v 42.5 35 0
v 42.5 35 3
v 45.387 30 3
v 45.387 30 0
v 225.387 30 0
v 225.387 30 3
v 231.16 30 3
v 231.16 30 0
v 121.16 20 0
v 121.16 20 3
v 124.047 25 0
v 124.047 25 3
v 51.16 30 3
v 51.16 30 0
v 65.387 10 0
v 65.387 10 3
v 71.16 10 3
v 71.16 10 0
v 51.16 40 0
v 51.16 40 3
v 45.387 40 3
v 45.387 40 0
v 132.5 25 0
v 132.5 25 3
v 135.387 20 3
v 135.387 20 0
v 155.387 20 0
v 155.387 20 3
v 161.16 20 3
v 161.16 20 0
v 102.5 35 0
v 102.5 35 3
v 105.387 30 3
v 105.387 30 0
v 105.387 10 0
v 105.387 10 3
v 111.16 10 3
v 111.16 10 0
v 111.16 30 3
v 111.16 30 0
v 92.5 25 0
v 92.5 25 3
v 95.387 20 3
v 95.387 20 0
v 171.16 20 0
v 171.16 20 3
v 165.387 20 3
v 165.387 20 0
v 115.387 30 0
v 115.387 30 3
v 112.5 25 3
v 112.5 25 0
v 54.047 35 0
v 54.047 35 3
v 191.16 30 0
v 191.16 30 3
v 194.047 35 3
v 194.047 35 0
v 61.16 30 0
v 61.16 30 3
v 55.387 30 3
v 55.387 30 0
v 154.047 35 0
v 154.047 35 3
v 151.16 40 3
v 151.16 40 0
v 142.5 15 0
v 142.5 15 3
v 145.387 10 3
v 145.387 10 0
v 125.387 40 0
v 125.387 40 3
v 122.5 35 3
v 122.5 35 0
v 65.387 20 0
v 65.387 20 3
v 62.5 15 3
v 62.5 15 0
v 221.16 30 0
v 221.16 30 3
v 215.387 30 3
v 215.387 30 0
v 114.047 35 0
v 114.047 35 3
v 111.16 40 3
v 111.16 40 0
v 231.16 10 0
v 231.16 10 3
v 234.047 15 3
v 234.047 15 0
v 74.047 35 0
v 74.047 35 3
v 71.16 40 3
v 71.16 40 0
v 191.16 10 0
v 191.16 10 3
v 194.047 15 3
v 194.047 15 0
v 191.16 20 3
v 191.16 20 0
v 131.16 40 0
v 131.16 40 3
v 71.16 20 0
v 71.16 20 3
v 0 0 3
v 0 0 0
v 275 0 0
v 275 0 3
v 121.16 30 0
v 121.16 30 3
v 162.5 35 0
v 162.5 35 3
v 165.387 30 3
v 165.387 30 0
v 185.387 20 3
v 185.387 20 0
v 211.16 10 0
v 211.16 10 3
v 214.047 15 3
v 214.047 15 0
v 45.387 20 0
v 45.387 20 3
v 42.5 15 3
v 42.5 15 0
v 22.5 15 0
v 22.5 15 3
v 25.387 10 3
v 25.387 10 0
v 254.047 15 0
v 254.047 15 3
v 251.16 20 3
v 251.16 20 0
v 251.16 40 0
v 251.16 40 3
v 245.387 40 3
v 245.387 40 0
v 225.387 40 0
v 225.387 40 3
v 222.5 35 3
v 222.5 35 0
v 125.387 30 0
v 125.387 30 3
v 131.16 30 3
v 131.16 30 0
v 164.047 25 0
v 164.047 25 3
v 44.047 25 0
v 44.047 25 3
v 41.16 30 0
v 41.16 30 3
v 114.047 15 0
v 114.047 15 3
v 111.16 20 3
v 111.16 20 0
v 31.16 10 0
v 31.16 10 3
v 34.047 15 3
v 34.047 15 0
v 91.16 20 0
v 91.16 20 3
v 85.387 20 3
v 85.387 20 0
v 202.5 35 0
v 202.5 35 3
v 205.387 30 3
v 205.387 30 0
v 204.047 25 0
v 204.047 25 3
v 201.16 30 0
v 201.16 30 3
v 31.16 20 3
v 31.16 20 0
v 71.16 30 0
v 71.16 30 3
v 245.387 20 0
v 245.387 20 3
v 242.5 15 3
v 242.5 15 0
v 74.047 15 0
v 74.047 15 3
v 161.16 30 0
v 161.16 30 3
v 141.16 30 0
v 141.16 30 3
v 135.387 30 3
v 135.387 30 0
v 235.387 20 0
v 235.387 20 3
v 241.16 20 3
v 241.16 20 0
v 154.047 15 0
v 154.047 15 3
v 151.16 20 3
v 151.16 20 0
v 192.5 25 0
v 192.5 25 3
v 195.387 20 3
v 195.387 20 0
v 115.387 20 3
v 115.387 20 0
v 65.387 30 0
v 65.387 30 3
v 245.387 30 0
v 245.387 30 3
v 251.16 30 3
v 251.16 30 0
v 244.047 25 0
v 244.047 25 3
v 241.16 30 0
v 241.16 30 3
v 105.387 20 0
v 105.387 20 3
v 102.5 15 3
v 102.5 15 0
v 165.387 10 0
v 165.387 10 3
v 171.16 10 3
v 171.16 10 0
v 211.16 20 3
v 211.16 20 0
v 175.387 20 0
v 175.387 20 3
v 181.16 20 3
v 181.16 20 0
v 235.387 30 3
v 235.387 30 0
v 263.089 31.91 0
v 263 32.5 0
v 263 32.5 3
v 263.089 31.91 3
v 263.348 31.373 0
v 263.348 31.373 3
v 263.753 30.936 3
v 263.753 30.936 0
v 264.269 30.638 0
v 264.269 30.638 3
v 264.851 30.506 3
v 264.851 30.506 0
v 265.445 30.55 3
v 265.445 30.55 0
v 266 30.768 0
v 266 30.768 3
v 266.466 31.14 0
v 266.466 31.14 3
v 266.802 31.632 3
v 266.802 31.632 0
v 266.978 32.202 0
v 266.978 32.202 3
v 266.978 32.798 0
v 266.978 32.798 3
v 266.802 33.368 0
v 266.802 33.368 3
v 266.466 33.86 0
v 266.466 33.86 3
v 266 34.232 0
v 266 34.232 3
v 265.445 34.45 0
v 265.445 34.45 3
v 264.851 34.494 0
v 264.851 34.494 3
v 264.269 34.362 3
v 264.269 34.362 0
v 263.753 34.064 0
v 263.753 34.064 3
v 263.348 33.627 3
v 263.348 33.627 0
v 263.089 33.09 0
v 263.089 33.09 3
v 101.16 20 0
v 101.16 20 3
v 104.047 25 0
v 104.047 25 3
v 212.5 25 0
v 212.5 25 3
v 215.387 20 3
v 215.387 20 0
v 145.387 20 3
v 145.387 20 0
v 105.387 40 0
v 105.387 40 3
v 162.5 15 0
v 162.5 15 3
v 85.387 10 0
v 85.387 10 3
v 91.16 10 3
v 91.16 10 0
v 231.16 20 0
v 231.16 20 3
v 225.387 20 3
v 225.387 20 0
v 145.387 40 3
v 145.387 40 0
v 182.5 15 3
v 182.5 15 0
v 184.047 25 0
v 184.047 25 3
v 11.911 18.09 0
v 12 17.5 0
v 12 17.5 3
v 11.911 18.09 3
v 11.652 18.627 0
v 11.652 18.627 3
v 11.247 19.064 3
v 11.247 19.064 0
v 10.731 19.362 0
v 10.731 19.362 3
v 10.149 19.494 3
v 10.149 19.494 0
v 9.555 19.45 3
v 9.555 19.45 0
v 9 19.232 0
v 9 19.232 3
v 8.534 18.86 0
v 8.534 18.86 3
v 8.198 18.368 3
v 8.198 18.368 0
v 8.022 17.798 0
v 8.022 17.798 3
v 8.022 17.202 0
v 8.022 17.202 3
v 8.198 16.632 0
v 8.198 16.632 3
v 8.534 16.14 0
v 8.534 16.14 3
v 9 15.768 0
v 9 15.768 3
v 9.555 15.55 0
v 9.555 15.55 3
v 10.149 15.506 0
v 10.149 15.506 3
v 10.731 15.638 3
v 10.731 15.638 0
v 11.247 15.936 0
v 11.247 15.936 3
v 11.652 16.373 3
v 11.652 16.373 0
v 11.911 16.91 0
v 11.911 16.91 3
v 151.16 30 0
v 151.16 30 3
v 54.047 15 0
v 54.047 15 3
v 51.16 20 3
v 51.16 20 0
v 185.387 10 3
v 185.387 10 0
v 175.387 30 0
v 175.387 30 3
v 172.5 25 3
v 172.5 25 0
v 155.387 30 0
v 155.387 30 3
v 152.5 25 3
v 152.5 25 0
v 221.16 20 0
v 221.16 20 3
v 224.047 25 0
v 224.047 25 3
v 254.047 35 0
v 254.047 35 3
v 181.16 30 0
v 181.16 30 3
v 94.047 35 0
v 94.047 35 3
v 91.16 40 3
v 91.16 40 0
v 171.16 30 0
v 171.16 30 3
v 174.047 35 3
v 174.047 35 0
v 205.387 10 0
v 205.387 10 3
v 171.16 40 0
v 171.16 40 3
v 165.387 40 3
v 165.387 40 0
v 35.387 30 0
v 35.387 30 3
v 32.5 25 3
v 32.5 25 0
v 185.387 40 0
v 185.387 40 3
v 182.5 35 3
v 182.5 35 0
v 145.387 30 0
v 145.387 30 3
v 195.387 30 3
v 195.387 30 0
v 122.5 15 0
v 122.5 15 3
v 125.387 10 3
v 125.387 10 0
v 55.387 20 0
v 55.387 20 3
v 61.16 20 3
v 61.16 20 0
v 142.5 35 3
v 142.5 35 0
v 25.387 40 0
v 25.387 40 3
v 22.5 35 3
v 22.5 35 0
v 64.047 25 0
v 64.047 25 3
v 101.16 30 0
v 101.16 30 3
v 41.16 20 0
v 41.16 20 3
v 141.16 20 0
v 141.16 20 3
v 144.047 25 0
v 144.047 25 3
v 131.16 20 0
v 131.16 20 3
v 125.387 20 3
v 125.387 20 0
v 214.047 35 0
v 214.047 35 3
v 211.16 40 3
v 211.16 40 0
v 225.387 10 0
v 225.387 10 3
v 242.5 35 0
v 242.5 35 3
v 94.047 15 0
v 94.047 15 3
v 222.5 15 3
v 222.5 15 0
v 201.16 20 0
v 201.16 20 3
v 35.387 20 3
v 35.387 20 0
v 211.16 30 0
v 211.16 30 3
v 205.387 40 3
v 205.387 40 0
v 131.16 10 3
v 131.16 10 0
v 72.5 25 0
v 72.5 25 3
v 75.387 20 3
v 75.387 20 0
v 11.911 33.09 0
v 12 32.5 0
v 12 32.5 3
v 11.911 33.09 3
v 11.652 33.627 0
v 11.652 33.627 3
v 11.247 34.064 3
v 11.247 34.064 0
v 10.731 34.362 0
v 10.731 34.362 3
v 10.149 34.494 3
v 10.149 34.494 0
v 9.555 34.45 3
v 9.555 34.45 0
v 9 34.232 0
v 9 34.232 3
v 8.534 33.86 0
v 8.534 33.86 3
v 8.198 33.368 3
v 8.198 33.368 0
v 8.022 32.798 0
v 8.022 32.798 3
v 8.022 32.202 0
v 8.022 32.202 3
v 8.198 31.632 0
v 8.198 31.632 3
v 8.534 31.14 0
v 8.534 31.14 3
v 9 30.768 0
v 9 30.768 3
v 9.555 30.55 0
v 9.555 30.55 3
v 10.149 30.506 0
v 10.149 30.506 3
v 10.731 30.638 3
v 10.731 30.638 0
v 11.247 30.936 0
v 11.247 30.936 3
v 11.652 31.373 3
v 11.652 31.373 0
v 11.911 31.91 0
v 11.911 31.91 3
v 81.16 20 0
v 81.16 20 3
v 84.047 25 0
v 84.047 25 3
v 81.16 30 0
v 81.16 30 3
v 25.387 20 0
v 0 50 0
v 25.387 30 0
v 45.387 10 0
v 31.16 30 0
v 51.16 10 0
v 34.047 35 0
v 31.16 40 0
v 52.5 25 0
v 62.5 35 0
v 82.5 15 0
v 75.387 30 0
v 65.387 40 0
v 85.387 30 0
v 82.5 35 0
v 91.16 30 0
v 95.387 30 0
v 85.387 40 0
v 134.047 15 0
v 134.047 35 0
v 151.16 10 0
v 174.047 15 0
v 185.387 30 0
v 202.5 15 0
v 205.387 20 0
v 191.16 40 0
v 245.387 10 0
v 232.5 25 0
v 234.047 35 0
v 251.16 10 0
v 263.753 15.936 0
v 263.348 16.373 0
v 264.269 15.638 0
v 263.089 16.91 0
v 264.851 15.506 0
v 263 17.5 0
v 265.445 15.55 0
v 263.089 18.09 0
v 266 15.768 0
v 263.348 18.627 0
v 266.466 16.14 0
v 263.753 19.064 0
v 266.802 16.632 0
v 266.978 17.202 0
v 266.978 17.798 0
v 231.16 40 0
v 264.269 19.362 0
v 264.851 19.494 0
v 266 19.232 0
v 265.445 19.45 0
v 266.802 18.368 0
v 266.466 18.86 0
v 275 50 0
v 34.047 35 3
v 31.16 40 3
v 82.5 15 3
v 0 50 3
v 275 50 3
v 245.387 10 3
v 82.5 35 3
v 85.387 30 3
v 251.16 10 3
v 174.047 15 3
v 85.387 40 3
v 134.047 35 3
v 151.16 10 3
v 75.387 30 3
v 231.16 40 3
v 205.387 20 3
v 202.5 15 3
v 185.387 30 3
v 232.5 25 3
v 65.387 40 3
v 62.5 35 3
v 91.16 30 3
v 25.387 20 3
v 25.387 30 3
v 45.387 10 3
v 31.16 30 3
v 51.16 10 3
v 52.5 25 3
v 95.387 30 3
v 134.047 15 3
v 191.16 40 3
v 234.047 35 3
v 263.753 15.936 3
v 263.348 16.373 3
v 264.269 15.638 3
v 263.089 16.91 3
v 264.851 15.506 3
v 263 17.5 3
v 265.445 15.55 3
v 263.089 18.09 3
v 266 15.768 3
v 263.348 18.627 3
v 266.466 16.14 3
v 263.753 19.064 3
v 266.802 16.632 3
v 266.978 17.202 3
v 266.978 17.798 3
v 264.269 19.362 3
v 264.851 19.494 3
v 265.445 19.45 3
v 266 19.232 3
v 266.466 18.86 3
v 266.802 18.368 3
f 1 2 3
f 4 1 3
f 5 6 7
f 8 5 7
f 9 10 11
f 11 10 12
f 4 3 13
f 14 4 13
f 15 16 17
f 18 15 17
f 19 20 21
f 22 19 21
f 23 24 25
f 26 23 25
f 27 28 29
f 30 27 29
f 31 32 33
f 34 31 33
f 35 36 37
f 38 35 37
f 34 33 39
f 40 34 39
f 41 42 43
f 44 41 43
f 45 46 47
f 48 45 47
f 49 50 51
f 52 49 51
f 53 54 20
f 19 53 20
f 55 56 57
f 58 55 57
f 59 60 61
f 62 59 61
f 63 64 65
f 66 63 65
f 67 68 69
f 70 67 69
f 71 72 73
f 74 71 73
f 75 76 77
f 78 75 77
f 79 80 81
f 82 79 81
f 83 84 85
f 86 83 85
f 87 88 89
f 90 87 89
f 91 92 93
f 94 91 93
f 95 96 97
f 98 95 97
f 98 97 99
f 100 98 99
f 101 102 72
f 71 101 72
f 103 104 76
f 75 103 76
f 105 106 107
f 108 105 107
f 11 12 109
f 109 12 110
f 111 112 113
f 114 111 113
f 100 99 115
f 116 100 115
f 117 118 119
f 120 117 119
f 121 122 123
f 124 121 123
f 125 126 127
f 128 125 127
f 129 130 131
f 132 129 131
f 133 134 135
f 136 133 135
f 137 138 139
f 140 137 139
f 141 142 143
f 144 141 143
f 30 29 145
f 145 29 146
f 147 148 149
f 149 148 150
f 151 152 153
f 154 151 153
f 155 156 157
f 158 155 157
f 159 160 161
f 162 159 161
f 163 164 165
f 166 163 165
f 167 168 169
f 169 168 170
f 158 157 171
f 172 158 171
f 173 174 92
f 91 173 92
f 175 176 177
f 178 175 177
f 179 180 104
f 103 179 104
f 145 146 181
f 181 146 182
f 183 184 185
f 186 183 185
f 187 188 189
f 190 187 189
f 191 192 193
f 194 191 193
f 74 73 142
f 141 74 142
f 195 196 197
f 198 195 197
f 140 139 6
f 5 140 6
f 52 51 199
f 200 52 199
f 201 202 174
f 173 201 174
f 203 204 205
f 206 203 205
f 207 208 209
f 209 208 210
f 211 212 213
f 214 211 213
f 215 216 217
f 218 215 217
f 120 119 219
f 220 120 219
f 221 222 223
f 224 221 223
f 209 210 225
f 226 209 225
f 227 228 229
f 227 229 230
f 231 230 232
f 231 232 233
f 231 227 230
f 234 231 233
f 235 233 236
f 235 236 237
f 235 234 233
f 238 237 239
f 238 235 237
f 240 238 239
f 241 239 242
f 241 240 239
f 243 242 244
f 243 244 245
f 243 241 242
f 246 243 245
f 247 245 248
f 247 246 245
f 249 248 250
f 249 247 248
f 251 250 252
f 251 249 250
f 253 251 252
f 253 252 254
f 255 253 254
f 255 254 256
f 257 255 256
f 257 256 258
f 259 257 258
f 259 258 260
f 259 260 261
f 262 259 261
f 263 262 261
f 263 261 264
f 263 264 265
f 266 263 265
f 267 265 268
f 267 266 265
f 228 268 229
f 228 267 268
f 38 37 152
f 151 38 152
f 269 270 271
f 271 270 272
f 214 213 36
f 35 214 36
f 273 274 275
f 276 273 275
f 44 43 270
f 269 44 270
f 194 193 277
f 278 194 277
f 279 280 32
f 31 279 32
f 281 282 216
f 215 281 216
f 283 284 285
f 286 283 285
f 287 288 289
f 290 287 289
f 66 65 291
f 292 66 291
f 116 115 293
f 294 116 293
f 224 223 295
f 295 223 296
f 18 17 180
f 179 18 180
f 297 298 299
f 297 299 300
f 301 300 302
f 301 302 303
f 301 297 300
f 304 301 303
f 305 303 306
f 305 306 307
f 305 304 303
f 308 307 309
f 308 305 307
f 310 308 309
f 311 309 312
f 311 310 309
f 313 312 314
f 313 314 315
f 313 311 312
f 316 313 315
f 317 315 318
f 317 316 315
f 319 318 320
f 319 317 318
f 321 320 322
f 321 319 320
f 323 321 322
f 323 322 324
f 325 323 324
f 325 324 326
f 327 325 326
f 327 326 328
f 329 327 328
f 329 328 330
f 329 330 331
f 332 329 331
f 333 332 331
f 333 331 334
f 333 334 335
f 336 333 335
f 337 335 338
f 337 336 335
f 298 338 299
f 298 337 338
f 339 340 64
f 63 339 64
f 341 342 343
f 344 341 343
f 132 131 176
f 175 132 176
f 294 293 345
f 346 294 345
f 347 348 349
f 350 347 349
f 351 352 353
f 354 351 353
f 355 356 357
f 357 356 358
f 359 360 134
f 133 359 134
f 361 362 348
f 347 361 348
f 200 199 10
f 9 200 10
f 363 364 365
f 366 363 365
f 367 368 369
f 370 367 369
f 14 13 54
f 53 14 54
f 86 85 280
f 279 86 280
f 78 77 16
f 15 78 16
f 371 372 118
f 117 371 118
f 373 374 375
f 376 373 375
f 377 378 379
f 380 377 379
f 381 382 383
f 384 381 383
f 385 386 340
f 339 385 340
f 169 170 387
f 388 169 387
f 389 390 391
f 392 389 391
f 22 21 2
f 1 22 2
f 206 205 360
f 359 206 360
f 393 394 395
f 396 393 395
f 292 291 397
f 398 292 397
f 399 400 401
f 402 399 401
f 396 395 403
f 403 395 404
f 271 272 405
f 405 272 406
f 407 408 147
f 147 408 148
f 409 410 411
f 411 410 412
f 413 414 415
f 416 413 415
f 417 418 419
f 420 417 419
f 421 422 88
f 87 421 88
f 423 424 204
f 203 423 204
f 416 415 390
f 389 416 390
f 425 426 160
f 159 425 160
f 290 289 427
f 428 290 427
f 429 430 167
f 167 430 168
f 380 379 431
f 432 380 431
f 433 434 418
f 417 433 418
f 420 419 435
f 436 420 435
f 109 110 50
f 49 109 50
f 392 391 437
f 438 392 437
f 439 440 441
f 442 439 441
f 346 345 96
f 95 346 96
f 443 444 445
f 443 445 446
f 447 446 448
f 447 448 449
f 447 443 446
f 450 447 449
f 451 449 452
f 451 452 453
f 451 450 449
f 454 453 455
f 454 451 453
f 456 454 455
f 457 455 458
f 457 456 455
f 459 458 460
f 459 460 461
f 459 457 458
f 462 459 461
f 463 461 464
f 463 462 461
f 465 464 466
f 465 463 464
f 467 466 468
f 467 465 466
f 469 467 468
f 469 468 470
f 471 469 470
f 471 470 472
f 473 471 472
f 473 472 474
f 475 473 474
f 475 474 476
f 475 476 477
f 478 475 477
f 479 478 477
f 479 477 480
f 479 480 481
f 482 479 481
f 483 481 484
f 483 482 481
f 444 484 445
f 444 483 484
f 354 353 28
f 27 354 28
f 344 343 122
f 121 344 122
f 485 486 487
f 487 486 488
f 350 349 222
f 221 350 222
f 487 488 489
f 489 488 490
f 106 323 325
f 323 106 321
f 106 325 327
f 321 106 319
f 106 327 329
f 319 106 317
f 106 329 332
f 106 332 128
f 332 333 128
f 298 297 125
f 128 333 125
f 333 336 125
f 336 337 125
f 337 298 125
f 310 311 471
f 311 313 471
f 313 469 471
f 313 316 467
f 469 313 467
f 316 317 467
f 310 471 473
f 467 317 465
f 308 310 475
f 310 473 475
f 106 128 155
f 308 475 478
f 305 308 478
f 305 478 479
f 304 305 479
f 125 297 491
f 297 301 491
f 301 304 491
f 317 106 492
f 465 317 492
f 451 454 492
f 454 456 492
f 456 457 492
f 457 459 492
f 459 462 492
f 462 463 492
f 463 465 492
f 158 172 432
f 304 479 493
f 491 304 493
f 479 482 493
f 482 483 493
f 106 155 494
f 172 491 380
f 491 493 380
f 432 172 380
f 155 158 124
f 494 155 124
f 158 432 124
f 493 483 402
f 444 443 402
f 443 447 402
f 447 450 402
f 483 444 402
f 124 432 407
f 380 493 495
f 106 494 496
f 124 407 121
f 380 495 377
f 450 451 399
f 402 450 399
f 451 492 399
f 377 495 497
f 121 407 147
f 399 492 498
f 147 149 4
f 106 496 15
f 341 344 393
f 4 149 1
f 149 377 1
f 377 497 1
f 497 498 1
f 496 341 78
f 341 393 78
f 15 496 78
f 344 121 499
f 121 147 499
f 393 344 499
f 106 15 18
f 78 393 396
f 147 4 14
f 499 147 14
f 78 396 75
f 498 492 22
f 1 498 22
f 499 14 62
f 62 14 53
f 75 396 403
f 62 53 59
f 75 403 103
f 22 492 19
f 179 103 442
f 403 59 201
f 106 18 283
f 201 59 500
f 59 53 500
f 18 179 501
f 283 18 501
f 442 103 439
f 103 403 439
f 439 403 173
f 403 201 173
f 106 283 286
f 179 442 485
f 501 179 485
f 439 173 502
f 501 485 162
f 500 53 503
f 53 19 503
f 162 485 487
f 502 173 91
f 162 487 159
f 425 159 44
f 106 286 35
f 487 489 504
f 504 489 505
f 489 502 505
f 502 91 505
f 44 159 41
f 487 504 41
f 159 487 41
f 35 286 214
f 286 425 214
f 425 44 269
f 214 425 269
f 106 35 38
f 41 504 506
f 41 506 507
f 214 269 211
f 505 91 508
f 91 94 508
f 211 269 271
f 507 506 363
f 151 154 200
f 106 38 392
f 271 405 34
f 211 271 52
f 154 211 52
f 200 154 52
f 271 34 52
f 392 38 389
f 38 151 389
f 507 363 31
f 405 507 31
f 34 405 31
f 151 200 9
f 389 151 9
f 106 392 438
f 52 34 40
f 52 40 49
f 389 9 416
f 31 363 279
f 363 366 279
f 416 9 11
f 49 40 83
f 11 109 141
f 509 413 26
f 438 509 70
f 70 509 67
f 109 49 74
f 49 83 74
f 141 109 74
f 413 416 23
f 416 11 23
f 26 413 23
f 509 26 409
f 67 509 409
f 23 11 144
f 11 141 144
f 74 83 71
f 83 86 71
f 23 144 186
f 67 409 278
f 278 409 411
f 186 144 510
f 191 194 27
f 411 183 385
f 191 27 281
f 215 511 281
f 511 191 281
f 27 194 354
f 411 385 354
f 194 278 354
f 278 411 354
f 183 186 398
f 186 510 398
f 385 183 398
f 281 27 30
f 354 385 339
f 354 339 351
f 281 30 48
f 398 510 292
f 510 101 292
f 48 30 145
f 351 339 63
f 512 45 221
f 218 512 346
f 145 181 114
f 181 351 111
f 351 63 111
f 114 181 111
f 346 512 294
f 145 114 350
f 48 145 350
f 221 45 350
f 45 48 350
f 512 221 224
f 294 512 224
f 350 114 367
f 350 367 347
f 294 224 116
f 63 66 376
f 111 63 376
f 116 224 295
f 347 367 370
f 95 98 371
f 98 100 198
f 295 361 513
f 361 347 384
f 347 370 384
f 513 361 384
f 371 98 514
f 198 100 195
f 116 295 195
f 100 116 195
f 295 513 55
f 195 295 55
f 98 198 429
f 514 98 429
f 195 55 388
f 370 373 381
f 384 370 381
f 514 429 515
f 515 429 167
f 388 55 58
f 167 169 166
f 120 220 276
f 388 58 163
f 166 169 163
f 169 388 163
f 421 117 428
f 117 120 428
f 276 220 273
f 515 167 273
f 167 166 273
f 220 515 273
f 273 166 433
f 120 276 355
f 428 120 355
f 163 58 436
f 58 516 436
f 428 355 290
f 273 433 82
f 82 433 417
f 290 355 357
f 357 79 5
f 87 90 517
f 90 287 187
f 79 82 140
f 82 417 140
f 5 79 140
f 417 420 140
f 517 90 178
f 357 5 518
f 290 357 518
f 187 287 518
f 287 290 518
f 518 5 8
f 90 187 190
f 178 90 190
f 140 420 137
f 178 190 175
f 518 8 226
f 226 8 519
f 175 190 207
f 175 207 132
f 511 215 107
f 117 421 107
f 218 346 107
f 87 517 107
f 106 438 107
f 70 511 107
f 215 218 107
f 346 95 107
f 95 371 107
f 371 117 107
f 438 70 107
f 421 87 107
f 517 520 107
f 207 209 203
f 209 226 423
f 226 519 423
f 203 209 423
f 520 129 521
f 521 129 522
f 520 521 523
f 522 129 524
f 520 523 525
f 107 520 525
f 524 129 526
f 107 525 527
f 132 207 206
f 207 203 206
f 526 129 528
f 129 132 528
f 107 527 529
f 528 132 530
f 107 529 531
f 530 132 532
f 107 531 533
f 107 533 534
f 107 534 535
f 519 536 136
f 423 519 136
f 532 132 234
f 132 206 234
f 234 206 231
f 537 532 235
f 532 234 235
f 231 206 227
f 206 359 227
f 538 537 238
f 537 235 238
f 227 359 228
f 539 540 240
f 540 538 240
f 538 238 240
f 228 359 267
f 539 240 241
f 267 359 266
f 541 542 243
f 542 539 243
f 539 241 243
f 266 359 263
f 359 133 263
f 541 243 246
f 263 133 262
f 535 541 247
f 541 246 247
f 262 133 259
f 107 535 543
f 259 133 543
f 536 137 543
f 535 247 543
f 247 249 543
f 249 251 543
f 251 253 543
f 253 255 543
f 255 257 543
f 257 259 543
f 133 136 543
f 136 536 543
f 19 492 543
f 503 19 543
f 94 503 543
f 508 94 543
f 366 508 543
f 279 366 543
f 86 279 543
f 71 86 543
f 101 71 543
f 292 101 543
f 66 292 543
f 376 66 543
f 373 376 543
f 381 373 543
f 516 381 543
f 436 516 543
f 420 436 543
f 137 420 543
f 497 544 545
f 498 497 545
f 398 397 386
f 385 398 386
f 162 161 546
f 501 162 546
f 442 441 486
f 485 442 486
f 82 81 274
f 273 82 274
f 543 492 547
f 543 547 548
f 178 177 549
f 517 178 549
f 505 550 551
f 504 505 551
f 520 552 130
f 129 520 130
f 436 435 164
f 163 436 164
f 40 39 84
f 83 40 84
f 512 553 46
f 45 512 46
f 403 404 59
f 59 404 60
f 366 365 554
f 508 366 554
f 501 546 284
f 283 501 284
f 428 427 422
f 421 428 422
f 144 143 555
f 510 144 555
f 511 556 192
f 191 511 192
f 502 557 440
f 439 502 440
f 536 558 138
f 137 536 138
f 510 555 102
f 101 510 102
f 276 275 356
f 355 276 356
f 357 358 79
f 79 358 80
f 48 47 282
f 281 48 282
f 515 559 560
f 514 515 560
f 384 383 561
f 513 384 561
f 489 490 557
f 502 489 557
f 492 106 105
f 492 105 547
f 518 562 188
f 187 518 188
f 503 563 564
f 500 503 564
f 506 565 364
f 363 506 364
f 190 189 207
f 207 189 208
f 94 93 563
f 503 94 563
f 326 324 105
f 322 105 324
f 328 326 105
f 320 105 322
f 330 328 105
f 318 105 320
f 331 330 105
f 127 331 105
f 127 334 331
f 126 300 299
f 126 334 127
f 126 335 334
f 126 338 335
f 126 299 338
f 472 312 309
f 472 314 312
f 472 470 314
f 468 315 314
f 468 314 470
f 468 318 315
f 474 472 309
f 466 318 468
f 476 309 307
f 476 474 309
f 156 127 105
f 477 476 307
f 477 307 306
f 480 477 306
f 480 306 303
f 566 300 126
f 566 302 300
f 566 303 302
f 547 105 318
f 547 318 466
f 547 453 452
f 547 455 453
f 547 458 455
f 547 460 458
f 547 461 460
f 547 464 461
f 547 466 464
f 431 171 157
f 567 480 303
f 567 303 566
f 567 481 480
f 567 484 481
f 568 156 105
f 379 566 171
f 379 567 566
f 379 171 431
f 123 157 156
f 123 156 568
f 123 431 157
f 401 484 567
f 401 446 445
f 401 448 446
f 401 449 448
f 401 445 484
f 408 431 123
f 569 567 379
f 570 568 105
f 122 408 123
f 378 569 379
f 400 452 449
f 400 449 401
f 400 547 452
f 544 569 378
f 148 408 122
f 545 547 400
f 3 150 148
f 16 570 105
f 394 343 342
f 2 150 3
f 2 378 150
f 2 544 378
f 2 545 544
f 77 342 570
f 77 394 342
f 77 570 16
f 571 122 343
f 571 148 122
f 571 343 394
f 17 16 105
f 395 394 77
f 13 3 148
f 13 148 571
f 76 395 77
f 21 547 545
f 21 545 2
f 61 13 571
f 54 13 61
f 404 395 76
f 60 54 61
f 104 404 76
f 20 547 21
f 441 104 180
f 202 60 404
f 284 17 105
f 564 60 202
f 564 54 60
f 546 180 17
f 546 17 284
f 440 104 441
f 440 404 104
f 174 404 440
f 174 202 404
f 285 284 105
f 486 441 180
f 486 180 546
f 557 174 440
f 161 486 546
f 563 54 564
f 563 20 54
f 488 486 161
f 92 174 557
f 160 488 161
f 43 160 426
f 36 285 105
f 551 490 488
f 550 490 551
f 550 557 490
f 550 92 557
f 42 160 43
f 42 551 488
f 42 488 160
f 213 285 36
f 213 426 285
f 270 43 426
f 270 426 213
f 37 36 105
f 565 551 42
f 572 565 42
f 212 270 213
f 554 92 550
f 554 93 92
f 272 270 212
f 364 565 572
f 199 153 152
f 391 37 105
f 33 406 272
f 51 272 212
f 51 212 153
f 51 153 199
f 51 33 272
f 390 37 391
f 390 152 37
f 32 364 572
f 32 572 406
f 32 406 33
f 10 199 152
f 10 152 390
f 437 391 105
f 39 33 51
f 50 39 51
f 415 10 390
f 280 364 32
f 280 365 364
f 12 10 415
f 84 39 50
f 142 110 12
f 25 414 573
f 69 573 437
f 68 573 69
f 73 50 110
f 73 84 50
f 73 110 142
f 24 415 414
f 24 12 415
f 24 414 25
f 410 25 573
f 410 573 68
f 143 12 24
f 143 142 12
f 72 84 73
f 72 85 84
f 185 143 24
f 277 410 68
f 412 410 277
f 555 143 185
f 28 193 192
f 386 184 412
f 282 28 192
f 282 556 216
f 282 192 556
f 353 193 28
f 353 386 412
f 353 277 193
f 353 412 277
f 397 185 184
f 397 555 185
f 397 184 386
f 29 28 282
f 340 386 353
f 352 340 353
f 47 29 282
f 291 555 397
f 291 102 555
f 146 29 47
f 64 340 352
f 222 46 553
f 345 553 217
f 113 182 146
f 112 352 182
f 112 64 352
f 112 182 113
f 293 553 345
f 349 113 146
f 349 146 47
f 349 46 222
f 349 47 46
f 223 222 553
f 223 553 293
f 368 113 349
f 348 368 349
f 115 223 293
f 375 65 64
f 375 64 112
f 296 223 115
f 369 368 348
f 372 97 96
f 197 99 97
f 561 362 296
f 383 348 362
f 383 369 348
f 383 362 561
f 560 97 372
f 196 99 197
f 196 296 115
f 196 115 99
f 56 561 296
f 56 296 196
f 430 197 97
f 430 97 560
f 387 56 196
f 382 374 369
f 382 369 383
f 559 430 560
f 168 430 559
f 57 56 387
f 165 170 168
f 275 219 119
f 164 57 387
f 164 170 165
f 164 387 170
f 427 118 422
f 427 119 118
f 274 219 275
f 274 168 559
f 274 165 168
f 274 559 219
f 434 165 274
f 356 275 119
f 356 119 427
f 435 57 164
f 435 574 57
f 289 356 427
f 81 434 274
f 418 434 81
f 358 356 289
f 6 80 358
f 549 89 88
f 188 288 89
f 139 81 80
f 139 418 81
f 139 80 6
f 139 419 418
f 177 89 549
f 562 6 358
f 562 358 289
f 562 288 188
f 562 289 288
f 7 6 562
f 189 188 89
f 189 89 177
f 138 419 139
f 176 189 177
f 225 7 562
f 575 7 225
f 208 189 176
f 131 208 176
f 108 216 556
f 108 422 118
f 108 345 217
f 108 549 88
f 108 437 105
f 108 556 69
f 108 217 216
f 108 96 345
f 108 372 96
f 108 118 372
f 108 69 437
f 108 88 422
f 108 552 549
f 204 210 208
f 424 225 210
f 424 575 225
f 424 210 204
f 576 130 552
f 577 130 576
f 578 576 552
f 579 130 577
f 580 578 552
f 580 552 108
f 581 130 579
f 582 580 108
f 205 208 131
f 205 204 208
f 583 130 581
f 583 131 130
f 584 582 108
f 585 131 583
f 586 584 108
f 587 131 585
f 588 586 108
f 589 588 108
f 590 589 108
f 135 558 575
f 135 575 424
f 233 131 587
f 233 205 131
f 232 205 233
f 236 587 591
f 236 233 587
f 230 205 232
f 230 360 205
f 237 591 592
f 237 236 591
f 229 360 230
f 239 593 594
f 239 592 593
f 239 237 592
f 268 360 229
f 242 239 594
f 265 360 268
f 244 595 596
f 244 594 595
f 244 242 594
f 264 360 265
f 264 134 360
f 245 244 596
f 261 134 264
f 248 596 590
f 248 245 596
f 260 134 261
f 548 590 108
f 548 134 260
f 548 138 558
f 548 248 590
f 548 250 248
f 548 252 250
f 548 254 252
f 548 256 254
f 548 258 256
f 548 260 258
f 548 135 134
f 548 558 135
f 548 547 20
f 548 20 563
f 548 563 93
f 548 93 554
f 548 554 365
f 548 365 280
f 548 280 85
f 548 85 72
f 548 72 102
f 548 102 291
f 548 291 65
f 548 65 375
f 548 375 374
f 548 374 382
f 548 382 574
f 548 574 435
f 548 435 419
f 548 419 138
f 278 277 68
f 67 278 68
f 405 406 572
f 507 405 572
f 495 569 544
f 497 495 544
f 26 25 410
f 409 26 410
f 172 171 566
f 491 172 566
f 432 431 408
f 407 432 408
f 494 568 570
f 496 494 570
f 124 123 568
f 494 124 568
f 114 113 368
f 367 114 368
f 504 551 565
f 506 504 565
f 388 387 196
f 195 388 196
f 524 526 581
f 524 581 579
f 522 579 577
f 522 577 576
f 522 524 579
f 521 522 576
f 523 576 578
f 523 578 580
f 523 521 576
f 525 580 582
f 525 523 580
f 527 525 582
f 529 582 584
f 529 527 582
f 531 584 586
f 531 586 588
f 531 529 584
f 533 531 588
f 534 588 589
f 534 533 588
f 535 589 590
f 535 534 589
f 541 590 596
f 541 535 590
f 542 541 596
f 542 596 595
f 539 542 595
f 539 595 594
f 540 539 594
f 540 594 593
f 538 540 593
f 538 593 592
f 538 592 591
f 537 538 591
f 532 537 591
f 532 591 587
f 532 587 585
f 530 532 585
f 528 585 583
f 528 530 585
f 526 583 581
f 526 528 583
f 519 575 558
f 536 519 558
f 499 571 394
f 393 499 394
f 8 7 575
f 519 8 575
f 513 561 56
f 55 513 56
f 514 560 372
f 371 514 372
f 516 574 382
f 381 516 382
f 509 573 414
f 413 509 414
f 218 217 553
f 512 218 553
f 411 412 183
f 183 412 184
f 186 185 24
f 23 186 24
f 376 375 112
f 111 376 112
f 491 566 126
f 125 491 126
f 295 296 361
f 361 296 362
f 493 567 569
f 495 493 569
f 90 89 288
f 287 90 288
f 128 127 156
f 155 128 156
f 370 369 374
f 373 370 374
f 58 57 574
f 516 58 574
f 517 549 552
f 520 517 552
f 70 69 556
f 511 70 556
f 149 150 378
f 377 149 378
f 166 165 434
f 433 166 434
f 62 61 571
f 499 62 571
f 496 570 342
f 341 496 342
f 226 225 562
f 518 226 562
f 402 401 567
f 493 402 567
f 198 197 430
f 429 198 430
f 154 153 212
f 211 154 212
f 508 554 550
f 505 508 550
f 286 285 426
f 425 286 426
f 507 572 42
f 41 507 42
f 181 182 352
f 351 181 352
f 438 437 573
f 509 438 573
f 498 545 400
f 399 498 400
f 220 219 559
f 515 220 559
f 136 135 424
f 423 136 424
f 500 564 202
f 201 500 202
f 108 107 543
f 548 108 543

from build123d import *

# Parameters (mm, degrees)
SKETCH1_W           = 275
SKETCH1_H           = 50
SKETCH1_R           = 2
BOSS_EXTRUDE1_DEPTH = 3
CUT_EXTRUDE2_DEPTH  = 3
LPATTERN1_COUNT     = 12
LPATTERN1_PITCH     = 20
CUT_EXTRUDE3_DEPTH  = 3
LPATTERN2_COUNT     = 11
LPATTERN2_PITCH     = 20
CUT_EXTRUDE4_DEPTH  = 3
LPATTERN3_COUNT     = 12
LPATTERN3_PITCH     = 20


with BuildPart() as part:
    # Sketch1 → Boss-Extrude1 (new body)
    with BuildSketch(Plane.XY):
        with Locations((137.5, 25)):
            Rectangle(SKETCH1_W, SKETCH1_H)
        with Locations((10, 32.5)):
            Circle(SKETCH1_R, mode=Mode.SUBTRACT)
        with Locations((10, 17.5)):
            Circle(SKETCH1_R, mode=Mode.SUBTRACT)
        with Locations(Location((265, 17.5, 0), (0, 0, 180))):
            Circle(SKETCH1_R, mode=Mode.SUBTRACT)
        with Locations(Location((265, 32.5, 0), (0, 0, 180))):
            Circle(SKETCH1_R, mode=Mode.SUBTRACT)
    extrude(amount=BOSS_EXTRUDE1_DEPTH)

    # Sketch3 → Cut-Extrude2 (cut)
    with BuildSketch(Plane.XY.offset(3)):
        Polygon((34.047005384, 35), (31.160254038, 40), (25.386751346, 40), (22.5, 35), (25.386751346, 30), (31.160254038, 30), align=None)
    cut_extrude2 = extrude(amount=-CUT_EXTRUDE2_DEPTH, mode=Mode.SUBTRACT)

    # LPattern1: Cut-Extrude2 ×12
    with Locations(*[(i * LPATTERN1_PITCH, 0, 0) for i in range(1, LPATTERN1_COUNT)]):
        add(cut_extrude2, mode=Mode.SUBTRACT)

    # Sketch5 → Cut-Extrude3 (cut)
    with BuildSketch(Plane.XY.offset(3)):
        Polygon((32.5, 25), (35.386751346, 20), (41.160254038, 20), (44.047005384, 25), (41.160254038, 30), (35.386751346, 30), align=None)
    cut_extrude3 = extrude(amount=-CUT_EXTRUDE3_DEPTH, mode=Mode.SUBTRACT)

    # LPattern2: Cut-Extrude3 ×11
    with Locations(*[(i * LPATTERN2_PITCH, 0, 0) for i in range(1, LPATTERN2_COUNT)]):
        add(cut_extrude3, mode=Mode.SUBTRACT)

    # Sketch6 → Cut-Extrude4 (cut)
    with BuildSketch(Plane.XY.offset(3)):
        Polygon((34.047005384, 15), (31.160254038, 20), (25.386751346, 20), (22.5, 15), (25.386751346, 10), (31.160254038, 10), align=None)
    cut_extrude4 = extrude(amount=-CUT_EXTRUDE4_DEPTH, mode=Mode.SUBTRACT)

    # LPattern3: Cut-Extrude4 ×12
    with Locations(*[(i * LPATTERN3_PITCH, 0, 0) for i in range(1, LPATTERN3_COUNT)]):
        add(cut_extrude4, mode=Mode.SUBTRACT)


solid = part.part
